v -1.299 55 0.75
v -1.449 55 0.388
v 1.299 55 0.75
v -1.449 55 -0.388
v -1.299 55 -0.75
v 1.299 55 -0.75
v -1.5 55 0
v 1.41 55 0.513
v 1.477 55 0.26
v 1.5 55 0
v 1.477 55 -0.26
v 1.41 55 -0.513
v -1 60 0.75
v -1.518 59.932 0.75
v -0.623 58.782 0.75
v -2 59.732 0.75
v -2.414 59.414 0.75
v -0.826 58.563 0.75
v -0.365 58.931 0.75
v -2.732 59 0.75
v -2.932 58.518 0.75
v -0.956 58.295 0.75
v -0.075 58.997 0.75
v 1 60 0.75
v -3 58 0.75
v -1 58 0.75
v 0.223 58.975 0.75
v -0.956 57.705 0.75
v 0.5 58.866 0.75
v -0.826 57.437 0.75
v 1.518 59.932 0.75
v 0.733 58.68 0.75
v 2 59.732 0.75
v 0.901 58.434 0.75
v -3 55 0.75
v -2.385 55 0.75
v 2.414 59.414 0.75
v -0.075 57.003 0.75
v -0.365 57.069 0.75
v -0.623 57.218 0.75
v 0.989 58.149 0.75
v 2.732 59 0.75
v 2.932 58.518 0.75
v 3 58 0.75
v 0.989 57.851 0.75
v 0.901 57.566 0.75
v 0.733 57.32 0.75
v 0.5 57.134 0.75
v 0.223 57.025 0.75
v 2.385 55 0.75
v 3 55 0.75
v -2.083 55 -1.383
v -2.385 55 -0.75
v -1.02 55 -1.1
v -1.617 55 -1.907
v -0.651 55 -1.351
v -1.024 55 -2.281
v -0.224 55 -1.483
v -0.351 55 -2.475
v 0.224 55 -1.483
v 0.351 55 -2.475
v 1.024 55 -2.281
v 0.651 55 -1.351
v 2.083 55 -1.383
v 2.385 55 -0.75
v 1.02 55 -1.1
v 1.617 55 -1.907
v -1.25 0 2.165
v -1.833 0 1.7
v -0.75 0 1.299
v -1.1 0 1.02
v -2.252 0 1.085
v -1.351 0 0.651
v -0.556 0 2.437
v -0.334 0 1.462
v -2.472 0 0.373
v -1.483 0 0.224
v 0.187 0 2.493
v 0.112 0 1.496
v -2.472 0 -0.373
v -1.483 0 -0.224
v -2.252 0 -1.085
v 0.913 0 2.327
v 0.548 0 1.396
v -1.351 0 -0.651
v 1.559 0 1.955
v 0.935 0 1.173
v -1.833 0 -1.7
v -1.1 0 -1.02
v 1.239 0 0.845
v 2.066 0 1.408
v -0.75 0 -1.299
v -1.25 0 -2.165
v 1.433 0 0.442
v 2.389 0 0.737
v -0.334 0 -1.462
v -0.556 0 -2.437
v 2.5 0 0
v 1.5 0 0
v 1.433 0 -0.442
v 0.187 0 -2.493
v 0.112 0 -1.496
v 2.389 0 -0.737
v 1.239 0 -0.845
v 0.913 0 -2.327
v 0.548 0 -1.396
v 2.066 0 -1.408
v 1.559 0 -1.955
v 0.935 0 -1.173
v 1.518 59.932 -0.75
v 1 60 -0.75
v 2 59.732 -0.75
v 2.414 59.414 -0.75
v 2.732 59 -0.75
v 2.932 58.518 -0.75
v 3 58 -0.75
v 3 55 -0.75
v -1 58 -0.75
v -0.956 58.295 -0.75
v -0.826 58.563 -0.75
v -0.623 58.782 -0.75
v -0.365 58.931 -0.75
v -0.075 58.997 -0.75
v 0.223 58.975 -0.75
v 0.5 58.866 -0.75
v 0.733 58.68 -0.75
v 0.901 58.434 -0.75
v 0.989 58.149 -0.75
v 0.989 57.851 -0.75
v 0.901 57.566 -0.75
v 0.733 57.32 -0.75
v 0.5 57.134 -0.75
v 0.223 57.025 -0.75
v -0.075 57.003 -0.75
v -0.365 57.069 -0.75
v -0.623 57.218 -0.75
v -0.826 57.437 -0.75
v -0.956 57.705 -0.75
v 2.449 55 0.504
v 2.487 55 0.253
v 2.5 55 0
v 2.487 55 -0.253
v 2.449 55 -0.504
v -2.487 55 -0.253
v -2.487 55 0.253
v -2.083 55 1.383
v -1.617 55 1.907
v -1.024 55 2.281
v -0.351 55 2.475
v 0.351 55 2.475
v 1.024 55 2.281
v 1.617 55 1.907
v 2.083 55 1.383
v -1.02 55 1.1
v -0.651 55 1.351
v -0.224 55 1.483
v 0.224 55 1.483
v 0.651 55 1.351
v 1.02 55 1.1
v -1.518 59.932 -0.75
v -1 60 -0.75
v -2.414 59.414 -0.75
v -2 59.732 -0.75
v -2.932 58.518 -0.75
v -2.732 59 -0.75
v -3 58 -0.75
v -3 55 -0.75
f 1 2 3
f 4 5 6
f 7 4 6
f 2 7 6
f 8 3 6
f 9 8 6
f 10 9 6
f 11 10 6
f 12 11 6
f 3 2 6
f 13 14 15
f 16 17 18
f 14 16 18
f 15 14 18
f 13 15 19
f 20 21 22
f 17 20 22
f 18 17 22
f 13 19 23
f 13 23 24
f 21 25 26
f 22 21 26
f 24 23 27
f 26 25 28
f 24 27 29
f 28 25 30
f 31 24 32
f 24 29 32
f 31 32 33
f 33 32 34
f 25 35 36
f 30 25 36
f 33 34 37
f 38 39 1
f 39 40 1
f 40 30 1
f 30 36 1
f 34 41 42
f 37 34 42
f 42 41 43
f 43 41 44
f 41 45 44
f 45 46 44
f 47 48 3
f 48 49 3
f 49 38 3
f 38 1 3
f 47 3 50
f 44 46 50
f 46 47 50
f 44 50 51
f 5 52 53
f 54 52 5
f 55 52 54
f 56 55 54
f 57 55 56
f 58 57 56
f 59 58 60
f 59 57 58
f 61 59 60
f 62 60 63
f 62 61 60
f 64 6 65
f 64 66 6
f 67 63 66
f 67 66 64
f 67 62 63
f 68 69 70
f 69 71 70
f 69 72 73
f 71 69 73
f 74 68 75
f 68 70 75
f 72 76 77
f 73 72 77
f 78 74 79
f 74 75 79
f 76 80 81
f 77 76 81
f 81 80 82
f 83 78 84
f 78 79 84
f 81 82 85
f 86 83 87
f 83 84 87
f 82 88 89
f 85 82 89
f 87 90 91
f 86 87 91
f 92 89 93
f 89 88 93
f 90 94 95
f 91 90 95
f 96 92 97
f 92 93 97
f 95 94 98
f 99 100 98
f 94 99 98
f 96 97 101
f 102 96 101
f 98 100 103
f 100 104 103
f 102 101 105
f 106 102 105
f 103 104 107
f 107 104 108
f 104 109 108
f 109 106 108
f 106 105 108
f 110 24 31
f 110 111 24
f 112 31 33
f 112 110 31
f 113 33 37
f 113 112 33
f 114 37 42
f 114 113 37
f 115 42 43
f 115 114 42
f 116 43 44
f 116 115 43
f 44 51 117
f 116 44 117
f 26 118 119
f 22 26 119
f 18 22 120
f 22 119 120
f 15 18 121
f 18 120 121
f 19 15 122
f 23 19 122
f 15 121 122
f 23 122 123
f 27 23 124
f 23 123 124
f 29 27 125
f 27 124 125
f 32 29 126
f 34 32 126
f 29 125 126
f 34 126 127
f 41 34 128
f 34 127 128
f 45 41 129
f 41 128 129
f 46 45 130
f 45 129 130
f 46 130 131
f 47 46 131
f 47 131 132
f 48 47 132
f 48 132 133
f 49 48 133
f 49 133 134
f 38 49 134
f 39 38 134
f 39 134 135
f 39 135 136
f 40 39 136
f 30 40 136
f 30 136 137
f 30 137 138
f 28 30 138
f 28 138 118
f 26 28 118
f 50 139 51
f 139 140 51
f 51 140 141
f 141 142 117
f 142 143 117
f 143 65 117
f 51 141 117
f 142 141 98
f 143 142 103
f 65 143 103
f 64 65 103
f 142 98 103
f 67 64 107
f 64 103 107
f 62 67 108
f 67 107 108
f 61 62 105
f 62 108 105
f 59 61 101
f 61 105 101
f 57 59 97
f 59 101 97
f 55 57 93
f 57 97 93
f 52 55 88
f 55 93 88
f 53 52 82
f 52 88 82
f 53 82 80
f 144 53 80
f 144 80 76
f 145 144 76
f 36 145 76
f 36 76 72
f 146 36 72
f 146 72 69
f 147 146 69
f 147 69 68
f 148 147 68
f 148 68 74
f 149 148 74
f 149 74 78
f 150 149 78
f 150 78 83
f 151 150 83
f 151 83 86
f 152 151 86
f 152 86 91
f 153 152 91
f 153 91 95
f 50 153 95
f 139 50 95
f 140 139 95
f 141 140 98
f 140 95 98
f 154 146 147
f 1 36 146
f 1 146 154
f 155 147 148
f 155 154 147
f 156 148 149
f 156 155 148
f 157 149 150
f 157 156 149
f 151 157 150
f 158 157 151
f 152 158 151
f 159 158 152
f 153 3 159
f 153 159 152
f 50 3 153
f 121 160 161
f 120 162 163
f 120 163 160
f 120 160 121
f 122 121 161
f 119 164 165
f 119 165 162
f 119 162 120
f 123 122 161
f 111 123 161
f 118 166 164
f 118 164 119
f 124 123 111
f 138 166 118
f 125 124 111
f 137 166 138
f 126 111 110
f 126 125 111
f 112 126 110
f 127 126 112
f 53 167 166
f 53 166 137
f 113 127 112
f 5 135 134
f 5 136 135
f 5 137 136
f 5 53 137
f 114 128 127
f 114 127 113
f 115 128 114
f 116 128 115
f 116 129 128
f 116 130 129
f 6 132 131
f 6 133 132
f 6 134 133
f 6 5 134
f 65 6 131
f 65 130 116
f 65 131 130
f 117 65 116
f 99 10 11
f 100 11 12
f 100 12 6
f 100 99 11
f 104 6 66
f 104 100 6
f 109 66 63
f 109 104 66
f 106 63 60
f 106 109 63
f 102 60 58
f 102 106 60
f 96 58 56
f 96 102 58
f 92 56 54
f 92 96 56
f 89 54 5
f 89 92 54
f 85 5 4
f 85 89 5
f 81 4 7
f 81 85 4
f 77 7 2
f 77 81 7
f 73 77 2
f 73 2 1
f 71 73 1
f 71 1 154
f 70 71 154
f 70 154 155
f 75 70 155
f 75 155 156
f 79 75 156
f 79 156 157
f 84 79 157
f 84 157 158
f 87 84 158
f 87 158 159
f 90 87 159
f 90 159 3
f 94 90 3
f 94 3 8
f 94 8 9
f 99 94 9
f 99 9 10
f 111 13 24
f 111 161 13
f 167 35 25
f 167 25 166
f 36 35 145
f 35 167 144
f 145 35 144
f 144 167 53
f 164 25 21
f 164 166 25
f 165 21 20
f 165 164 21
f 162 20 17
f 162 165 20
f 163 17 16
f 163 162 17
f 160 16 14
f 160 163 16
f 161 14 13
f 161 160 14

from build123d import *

# Parameters (mm, degrees)
SKETCH1_R           = 2.5
SKETCH1_R_2         = 1.5
BOSS_EXTRUDE1_DEPTH = 55
SKETCH2_W           = 6
SKETCH2_H           = 1.5
BOSS_EXTRUDE2_DEPTH = 5
SKETCH3_R           = 1
CUT_EXTRUDE1_DEPTH  = 4.25
FILLET1_R           = 2


with BuildPart() as part:
    # Sketch1 → Boss-Extrude1 (new body)
    with BuildSketch(Plane(origin=(0, 0, 0), x_dir=(1, 0, 0), z_dir=(0, 1, 0))):
        Circle(SKETCH1_R)
        Circle(SKETCH1_R_2, mode=Mode.SUBTRACT)
    extrude(amount=BOSS_EXTRUDE1_DEPTH)

    # Sketch2 → Boss-Extrude2 (add)
    with BuildSketch(Plane(origin=(0, 55, 0), x_dir=(1, 0, 0), z_dir=(0, 1, 0))):
        Rectangle(SKETCH2_W, SKETCH2_H)
    extrude(amount=BOSS_EXTRUDE2_DEPTH)

    # Sketch3 → Cut-Extrude1 (cut, through all)
    with BuildSketch(Plane(origin=(0, 0, -0.75), x_dir=(-1, 0, 0), z_dir=(0, 0, -1))):
        with Locations((0, 58)):
            Circle(SKETCH3_R)
    extrude(amount=-CUT_EXTRUDE1_DEPTH, mode=Mode.SUBTRACT)

    # Fillet1
    fillet1_edges = [part.edges().sort_by_distance(p)[0] for p in [
        (3, 60, 0),
        (-3, 60, 0),
    ]]
    fillet(fillet1_edges, radius=FILLET1_R)


solid = part.part
